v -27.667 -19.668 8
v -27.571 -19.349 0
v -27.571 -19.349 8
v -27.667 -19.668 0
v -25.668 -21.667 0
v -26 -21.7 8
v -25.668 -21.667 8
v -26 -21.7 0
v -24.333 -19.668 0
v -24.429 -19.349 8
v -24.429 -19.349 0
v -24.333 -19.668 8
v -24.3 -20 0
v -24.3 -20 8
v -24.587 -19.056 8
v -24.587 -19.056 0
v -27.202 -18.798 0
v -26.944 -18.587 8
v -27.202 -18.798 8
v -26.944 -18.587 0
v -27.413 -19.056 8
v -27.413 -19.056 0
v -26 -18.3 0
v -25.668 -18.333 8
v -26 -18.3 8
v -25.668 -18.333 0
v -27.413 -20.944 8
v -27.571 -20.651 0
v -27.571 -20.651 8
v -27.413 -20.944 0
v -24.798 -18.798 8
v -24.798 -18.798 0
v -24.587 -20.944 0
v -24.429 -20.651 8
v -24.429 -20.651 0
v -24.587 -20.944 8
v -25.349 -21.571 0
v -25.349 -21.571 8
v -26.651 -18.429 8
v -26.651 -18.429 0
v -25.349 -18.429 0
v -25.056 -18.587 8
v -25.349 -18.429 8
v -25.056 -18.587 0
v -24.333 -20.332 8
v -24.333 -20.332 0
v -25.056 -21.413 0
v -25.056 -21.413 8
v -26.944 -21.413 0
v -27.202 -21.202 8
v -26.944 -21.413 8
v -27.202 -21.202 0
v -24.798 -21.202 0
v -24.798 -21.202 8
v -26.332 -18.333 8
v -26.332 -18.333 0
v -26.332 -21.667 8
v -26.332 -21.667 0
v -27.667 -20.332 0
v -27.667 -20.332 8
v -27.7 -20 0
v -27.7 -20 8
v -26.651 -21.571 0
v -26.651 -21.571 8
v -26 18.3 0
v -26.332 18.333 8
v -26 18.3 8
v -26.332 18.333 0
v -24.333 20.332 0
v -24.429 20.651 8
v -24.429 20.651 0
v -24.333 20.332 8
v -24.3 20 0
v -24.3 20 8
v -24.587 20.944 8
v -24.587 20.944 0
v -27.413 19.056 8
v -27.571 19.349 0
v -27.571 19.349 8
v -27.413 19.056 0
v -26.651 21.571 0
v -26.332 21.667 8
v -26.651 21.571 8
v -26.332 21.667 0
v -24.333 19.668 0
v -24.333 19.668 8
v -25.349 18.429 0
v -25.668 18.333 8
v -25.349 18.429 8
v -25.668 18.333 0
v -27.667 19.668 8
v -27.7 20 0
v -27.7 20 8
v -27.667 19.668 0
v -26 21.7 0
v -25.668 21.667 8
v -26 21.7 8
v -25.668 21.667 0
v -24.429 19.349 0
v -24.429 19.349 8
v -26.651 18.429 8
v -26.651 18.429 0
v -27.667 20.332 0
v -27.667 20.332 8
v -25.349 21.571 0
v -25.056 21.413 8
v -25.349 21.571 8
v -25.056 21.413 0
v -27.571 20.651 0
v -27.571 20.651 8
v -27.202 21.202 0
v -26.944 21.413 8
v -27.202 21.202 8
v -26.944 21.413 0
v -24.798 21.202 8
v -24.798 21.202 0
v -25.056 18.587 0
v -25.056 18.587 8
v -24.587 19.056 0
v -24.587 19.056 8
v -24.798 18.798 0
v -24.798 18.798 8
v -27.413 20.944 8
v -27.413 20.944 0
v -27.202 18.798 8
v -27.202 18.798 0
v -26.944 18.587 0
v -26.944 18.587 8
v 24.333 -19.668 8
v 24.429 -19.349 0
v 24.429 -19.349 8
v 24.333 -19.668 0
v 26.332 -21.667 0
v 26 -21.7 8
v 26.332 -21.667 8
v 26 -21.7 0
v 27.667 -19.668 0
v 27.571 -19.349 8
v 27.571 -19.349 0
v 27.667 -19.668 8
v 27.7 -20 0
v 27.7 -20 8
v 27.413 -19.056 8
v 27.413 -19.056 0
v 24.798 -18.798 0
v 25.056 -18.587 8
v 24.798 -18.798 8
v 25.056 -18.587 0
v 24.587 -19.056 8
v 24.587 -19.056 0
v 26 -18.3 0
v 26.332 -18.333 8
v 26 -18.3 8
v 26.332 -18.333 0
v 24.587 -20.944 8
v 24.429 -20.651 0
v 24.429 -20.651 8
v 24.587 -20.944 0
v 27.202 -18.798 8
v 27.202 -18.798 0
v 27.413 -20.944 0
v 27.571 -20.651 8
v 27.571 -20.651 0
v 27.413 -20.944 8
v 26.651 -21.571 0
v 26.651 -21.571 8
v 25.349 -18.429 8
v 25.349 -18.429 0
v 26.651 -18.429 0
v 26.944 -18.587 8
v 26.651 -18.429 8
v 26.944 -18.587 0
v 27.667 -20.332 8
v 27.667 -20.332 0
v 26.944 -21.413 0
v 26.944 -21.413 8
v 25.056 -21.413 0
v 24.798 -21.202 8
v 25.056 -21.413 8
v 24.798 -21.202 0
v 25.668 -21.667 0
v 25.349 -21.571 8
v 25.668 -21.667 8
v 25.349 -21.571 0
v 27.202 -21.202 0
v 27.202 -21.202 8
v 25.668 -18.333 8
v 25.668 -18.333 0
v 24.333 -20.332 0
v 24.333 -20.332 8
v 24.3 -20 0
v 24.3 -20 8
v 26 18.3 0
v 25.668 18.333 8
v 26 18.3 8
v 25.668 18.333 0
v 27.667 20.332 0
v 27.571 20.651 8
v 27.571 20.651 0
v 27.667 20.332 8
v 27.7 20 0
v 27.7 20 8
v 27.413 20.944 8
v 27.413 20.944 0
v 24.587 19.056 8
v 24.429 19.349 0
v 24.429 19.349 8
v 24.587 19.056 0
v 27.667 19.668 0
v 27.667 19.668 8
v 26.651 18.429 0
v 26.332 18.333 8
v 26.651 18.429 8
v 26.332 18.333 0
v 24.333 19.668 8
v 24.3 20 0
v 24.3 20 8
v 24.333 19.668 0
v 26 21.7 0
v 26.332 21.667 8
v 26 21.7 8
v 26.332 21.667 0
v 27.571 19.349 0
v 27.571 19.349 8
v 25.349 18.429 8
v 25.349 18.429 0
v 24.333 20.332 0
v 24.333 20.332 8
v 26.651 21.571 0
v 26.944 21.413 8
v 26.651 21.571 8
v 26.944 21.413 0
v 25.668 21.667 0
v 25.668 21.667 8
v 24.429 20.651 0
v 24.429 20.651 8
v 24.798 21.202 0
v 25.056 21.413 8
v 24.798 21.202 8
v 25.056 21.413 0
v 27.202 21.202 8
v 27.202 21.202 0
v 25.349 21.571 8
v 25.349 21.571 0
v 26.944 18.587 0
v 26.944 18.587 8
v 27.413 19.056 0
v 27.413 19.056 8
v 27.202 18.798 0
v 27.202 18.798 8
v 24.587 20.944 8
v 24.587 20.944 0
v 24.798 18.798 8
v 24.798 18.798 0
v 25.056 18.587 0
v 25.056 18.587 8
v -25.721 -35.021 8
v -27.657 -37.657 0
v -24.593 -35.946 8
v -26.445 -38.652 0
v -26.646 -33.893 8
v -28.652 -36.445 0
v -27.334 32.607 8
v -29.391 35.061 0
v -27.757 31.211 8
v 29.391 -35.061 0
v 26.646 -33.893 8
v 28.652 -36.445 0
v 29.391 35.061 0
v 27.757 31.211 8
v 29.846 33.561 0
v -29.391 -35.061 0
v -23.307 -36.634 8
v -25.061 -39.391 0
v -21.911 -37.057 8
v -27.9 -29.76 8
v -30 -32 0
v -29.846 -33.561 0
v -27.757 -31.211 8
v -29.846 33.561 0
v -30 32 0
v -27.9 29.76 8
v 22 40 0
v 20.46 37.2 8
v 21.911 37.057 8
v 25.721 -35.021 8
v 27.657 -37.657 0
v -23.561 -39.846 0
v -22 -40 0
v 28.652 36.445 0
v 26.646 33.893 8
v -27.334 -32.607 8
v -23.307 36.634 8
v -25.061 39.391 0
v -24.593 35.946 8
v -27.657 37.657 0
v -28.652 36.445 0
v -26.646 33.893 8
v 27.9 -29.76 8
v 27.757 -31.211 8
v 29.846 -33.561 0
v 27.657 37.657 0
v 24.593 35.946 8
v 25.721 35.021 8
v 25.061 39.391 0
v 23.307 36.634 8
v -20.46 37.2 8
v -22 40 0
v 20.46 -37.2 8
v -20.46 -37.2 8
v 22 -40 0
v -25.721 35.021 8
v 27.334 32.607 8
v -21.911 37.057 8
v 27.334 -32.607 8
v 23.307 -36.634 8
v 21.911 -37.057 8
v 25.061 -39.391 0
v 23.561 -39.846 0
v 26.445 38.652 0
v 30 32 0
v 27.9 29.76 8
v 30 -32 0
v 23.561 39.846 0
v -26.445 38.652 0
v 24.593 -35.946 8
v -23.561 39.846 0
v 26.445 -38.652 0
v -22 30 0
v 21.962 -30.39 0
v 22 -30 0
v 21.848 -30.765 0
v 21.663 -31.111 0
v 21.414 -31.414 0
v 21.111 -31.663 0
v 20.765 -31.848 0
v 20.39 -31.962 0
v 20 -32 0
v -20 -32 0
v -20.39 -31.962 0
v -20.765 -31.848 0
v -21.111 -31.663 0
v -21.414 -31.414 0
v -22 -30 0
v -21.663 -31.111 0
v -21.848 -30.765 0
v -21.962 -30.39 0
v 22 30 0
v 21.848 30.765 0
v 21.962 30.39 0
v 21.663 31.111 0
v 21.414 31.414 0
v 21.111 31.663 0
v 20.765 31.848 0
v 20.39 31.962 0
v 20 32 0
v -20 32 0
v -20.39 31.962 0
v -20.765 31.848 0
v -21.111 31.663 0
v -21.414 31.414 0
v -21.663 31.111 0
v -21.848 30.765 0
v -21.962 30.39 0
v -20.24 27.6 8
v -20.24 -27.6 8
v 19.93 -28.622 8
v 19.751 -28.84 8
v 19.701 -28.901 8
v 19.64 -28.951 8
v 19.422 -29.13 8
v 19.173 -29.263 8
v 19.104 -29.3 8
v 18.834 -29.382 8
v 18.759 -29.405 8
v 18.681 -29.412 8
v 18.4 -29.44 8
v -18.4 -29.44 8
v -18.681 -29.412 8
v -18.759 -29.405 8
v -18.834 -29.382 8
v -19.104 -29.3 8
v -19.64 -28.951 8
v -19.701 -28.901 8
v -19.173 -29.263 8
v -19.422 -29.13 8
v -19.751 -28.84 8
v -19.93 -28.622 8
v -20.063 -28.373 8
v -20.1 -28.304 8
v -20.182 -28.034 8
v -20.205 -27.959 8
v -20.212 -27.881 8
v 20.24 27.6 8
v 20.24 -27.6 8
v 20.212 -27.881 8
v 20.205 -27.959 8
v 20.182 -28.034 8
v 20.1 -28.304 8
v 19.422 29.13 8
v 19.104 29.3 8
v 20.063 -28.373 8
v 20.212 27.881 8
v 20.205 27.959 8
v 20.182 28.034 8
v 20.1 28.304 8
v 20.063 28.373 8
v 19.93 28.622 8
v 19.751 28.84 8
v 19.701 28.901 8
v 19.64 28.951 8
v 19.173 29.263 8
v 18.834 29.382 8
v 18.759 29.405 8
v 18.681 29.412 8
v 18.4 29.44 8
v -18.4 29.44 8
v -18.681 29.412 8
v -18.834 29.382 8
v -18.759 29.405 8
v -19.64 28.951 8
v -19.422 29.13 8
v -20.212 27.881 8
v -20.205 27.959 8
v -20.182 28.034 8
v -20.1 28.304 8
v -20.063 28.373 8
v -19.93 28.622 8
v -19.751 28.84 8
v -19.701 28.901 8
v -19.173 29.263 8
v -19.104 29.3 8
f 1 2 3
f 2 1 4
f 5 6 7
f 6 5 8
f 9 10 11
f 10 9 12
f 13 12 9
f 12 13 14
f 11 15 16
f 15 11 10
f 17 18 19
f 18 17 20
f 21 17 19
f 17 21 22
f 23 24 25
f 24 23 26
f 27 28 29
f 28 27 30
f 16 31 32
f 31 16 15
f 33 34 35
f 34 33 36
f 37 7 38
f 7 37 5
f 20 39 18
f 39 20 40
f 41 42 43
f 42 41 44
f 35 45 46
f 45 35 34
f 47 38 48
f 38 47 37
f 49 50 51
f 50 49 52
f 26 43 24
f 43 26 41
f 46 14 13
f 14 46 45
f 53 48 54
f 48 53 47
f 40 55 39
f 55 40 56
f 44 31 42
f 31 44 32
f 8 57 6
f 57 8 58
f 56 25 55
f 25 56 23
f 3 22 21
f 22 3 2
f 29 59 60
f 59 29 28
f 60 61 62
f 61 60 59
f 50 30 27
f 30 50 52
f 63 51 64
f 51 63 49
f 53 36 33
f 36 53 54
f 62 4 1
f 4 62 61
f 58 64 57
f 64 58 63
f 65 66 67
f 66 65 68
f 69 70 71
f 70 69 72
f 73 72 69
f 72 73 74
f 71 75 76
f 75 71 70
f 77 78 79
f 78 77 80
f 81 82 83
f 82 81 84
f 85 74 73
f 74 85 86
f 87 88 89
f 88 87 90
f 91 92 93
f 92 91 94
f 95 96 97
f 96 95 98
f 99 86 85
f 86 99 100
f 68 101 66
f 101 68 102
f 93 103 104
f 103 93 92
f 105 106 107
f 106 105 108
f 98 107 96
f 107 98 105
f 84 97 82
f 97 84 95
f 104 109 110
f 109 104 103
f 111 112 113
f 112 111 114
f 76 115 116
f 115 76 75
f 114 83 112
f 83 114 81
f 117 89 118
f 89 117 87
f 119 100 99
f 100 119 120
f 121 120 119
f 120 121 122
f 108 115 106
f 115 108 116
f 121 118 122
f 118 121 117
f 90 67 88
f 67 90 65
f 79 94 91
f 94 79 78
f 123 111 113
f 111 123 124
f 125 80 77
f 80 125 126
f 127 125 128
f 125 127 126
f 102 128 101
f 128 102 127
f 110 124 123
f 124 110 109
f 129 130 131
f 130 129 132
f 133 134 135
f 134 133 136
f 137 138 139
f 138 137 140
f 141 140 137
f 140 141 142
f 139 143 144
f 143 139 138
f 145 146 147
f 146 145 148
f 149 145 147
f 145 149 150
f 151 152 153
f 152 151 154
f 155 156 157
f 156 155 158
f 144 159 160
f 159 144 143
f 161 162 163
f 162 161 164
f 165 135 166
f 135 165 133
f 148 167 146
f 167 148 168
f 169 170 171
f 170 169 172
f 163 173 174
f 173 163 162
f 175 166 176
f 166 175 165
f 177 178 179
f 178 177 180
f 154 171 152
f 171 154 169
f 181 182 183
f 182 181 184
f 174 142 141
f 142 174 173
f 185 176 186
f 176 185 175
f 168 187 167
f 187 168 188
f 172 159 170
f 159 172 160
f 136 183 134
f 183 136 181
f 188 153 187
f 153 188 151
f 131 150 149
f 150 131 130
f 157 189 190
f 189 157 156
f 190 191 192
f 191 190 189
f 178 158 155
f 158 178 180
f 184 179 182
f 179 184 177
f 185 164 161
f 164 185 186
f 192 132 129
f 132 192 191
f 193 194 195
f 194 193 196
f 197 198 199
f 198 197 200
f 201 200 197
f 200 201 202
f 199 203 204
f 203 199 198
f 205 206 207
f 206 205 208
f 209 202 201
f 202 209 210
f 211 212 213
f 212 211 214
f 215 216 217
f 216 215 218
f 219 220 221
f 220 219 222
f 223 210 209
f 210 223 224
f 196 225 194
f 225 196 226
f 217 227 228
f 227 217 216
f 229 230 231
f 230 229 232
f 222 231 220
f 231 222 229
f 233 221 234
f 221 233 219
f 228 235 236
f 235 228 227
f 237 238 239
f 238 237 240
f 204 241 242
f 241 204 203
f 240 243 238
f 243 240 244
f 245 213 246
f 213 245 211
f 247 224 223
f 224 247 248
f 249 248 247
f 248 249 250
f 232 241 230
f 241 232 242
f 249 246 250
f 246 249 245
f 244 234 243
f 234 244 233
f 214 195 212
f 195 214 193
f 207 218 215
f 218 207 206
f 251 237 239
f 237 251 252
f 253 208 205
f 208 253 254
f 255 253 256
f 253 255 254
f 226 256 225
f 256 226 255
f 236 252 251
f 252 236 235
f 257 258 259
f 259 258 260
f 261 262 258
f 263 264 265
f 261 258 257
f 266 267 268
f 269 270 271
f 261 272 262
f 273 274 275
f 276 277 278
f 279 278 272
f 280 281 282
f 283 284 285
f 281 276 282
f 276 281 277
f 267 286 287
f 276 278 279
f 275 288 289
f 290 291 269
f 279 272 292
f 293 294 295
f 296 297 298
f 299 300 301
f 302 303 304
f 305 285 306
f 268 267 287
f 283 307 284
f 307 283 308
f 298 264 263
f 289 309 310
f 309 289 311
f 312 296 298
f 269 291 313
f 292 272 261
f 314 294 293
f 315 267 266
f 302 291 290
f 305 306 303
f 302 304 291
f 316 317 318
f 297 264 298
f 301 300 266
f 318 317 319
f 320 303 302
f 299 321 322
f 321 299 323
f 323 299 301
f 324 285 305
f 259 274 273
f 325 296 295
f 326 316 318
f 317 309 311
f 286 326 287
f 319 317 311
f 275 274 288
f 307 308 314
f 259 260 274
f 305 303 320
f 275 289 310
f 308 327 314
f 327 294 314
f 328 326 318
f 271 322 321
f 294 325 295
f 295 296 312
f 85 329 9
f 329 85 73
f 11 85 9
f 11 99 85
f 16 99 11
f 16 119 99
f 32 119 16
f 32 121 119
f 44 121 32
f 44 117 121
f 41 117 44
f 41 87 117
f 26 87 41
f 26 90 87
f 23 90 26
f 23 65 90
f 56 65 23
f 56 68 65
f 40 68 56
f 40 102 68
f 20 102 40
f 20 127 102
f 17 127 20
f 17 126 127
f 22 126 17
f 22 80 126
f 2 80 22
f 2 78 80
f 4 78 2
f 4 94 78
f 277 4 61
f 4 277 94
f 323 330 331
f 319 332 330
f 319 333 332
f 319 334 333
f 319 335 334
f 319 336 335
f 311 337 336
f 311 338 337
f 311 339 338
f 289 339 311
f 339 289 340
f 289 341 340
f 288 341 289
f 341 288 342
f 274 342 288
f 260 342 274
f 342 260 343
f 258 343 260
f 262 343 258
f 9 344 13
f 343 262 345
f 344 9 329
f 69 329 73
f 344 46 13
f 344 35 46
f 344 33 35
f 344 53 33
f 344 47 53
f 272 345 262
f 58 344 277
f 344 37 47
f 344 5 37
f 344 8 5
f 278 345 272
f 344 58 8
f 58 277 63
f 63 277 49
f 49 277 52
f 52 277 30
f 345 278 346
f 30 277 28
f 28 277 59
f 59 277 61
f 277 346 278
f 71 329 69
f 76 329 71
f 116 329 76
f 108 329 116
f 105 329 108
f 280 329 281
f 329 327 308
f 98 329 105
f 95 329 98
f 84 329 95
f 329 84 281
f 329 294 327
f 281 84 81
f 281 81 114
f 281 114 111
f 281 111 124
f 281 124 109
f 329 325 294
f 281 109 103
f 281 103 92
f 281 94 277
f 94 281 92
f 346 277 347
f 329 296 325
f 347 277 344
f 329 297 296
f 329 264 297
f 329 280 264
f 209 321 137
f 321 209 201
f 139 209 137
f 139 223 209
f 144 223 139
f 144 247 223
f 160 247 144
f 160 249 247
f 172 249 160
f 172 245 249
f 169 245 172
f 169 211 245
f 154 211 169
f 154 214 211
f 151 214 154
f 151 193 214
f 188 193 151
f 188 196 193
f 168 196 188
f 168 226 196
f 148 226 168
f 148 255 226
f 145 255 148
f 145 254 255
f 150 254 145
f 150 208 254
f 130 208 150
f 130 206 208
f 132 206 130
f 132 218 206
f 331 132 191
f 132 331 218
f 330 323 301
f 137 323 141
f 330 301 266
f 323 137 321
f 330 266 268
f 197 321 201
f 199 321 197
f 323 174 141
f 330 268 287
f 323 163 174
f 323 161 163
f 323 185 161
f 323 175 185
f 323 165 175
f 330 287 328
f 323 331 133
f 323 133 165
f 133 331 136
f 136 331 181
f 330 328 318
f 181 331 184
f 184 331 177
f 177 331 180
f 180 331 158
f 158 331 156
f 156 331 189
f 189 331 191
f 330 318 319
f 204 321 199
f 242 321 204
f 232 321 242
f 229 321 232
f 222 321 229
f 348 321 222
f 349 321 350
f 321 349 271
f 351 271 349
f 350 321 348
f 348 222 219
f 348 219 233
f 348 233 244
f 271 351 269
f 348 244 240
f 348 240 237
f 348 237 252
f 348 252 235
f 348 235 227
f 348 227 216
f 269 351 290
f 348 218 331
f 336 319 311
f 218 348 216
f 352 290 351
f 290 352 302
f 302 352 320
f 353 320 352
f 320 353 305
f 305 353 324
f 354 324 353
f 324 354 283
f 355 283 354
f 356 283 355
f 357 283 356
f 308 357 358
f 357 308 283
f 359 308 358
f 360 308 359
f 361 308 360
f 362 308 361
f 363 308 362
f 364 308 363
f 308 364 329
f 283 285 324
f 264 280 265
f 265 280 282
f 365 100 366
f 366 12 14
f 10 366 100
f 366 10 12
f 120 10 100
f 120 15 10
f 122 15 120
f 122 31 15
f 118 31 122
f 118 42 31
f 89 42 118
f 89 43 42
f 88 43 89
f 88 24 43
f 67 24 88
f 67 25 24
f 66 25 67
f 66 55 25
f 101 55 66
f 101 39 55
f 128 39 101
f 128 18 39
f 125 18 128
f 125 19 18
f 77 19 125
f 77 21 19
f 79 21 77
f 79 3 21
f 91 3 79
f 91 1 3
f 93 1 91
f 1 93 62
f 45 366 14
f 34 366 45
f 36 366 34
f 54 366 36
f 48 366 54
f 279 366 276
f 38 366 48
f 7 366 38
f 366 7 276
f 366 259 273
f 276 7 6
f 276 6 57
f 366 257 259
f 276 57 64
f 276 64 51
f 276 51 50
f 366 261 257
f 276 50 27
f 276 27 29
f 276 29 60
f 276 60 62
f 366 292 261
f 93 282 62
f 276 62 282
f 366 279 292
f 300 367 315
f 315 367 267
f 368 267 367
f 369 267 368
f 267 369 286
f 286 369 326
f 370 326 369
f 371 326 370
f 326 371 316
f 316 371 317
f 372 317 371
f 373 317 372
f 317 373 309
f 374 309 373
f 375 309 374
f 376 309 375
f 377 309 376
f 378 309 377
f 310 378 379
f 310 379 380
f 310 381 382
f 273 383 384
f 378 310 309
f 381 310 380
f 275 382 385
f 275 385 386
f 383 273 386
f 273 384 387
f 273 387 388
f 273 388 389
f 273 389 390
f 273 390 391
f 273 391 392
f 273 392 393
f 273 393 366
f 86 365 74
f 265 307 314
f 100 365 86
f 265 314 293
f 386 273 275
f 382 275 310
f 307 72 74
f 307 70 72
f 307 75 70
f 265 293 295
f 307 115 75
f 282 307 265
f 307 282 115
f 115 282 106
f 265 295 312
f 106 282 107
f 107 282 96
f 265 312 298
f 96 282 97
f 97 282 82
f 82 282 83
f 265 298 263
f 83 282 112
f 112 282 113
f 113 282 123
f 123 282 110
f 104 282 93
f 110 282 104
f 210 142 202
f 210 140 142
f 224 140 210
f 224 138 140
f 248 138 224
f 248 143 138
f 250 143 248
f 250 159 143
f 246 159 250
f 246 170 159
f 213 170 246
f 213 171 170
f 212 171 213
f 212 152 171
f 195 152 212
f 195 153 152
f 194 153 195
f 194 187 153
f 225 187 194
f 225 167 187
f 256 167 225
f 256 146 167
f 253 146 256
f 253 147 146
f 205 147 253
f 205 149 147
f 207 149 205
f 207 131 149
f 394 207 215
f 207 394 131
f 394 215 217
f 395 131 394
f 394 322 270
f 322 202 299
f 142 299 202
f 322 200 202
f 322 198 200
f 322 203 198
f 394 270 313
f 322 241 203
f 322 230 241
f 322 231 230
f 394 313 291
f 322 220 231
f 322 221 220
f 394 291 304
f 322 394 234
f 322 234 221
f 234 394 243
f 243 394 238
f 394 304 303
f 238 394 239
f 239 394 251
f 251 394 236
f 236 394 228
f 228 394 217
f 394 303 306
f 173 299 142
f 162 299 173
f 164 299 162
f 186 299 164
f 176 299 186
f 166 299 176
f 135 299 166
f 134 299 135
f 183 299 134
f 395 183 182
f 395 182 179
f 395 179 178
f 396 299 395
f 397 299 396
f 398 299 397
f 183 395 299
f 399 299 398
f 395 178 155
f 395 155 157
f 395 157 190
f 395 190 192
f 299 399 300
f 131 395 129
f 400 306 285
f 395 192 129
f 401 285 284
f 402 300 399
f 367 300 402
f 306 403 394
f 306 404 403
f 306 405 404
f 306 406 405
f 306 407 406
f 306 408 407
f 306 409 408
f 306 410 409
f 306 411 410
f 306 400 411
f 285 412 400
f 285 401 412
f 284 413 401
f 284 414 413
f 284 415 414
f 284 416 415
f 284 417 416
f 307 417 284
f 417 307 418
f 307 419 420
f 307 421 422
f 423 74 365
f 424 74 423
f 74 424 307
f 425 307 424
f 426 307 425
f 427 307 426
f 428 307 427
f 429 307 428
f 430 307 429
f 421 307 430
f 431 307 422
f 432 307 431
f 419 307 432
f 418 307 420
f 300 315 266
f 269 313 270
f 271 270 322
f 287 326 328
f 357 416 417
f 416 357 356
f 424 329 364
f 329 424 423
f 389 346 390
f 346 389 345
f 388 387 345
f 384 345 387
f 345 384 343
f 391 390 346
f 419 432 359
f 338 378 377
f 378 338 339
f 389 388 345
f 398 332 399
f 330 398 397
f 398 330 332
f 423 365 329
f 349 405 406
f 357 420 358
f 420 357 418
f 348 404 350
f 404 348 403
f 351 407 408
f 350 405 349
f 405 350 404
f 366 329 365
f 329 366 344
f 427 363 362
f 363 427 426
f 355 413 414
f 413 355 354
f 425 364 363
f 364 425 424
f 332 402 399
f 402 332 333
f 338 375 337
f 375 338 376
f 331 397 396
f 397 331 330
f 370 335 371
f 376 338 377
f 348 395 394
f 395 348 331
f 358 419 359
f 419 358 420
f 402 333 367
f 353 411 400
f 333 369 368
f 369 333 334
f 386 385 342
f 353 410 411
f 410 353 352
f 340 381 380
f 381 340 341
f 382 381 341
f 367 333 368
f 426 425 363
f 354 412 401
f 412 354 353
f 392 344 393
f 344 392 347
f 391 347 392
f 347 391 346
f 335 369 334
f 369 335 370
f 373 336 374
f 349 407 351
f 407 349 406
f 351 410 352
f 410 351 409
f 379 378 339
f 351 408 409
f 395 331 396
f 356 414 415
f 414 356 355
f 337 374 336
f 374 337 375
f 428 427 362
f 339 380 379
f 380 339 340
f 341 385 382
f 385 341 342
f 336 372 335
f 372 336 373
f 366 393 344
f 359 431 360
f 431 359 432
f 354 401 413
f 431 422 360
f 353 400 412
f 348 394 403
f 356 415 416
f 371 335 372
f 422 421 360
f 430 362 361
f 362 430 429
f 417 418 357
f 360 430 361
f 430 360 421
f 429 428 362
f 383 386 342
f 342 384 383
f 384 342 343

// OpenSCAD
$fn = 32;

// ----------------------------------------------------------------------
// Display bezel: 60 x 80 mm frame, opening 44x64 mm
// ----------------------------------------------------------------------

// --- parameters (mm) ---
length = 60;              // frame outside length, X
width = 80;               // frame outside width, Y
frame_w = 8;              // frame width
thickness = 8;            // frame thickness
corner_r = 8;             // outside corner radius
chamfer = 0.93;           // outer wall taper
funnel = 0.9;             // inner opening taper
opening_l = 44;           // opening length
opening_w = 64;           // opening width
inner_r = 2;              // opening corner radius
hole_d = 3.4;             // mounting screw clearance
holes_per_side = 2;       // holes per short side
hole_inset = 4;           // hole centre inset from the outside edge

/* rounded-rectangle outlines, generated with loops */
module rounded_ring(l_nom, w_nom, r) {
  hull() {
    for (sx = [-1, 1]) for (sy = [-1, 1])
      translate([sx * (l_nom / 2 - r), sy * (w_nom / 2 - r)]) circle(r = r);
  }
}

difference() {
  /* frame body, drafted so the outer edge is a variable-depth chamfer */
  linear_extrude(height = thickness, scale = chamfer)
    rounded_ring(length, width, corner_r);
  /* viewing opening, drafted the other way for a funnel edge */
  linear_extrude(height = thickness + 2, scale = funnel)
    translate([0, 0, -1]) rounded_ring(opening_l, opening_w, inner_r);
  /* mounting screws through the frame lands */
  for (sx = [-1, 1]) for (i = [1 : holes_per_side])
    translate([sx * (length / 2 - hole_inset),
               (i - (holes_per_side + 1) / 2) * width * 0.5, -1])
      cylinder(h = thickness + 2, d = hole_d);
}
